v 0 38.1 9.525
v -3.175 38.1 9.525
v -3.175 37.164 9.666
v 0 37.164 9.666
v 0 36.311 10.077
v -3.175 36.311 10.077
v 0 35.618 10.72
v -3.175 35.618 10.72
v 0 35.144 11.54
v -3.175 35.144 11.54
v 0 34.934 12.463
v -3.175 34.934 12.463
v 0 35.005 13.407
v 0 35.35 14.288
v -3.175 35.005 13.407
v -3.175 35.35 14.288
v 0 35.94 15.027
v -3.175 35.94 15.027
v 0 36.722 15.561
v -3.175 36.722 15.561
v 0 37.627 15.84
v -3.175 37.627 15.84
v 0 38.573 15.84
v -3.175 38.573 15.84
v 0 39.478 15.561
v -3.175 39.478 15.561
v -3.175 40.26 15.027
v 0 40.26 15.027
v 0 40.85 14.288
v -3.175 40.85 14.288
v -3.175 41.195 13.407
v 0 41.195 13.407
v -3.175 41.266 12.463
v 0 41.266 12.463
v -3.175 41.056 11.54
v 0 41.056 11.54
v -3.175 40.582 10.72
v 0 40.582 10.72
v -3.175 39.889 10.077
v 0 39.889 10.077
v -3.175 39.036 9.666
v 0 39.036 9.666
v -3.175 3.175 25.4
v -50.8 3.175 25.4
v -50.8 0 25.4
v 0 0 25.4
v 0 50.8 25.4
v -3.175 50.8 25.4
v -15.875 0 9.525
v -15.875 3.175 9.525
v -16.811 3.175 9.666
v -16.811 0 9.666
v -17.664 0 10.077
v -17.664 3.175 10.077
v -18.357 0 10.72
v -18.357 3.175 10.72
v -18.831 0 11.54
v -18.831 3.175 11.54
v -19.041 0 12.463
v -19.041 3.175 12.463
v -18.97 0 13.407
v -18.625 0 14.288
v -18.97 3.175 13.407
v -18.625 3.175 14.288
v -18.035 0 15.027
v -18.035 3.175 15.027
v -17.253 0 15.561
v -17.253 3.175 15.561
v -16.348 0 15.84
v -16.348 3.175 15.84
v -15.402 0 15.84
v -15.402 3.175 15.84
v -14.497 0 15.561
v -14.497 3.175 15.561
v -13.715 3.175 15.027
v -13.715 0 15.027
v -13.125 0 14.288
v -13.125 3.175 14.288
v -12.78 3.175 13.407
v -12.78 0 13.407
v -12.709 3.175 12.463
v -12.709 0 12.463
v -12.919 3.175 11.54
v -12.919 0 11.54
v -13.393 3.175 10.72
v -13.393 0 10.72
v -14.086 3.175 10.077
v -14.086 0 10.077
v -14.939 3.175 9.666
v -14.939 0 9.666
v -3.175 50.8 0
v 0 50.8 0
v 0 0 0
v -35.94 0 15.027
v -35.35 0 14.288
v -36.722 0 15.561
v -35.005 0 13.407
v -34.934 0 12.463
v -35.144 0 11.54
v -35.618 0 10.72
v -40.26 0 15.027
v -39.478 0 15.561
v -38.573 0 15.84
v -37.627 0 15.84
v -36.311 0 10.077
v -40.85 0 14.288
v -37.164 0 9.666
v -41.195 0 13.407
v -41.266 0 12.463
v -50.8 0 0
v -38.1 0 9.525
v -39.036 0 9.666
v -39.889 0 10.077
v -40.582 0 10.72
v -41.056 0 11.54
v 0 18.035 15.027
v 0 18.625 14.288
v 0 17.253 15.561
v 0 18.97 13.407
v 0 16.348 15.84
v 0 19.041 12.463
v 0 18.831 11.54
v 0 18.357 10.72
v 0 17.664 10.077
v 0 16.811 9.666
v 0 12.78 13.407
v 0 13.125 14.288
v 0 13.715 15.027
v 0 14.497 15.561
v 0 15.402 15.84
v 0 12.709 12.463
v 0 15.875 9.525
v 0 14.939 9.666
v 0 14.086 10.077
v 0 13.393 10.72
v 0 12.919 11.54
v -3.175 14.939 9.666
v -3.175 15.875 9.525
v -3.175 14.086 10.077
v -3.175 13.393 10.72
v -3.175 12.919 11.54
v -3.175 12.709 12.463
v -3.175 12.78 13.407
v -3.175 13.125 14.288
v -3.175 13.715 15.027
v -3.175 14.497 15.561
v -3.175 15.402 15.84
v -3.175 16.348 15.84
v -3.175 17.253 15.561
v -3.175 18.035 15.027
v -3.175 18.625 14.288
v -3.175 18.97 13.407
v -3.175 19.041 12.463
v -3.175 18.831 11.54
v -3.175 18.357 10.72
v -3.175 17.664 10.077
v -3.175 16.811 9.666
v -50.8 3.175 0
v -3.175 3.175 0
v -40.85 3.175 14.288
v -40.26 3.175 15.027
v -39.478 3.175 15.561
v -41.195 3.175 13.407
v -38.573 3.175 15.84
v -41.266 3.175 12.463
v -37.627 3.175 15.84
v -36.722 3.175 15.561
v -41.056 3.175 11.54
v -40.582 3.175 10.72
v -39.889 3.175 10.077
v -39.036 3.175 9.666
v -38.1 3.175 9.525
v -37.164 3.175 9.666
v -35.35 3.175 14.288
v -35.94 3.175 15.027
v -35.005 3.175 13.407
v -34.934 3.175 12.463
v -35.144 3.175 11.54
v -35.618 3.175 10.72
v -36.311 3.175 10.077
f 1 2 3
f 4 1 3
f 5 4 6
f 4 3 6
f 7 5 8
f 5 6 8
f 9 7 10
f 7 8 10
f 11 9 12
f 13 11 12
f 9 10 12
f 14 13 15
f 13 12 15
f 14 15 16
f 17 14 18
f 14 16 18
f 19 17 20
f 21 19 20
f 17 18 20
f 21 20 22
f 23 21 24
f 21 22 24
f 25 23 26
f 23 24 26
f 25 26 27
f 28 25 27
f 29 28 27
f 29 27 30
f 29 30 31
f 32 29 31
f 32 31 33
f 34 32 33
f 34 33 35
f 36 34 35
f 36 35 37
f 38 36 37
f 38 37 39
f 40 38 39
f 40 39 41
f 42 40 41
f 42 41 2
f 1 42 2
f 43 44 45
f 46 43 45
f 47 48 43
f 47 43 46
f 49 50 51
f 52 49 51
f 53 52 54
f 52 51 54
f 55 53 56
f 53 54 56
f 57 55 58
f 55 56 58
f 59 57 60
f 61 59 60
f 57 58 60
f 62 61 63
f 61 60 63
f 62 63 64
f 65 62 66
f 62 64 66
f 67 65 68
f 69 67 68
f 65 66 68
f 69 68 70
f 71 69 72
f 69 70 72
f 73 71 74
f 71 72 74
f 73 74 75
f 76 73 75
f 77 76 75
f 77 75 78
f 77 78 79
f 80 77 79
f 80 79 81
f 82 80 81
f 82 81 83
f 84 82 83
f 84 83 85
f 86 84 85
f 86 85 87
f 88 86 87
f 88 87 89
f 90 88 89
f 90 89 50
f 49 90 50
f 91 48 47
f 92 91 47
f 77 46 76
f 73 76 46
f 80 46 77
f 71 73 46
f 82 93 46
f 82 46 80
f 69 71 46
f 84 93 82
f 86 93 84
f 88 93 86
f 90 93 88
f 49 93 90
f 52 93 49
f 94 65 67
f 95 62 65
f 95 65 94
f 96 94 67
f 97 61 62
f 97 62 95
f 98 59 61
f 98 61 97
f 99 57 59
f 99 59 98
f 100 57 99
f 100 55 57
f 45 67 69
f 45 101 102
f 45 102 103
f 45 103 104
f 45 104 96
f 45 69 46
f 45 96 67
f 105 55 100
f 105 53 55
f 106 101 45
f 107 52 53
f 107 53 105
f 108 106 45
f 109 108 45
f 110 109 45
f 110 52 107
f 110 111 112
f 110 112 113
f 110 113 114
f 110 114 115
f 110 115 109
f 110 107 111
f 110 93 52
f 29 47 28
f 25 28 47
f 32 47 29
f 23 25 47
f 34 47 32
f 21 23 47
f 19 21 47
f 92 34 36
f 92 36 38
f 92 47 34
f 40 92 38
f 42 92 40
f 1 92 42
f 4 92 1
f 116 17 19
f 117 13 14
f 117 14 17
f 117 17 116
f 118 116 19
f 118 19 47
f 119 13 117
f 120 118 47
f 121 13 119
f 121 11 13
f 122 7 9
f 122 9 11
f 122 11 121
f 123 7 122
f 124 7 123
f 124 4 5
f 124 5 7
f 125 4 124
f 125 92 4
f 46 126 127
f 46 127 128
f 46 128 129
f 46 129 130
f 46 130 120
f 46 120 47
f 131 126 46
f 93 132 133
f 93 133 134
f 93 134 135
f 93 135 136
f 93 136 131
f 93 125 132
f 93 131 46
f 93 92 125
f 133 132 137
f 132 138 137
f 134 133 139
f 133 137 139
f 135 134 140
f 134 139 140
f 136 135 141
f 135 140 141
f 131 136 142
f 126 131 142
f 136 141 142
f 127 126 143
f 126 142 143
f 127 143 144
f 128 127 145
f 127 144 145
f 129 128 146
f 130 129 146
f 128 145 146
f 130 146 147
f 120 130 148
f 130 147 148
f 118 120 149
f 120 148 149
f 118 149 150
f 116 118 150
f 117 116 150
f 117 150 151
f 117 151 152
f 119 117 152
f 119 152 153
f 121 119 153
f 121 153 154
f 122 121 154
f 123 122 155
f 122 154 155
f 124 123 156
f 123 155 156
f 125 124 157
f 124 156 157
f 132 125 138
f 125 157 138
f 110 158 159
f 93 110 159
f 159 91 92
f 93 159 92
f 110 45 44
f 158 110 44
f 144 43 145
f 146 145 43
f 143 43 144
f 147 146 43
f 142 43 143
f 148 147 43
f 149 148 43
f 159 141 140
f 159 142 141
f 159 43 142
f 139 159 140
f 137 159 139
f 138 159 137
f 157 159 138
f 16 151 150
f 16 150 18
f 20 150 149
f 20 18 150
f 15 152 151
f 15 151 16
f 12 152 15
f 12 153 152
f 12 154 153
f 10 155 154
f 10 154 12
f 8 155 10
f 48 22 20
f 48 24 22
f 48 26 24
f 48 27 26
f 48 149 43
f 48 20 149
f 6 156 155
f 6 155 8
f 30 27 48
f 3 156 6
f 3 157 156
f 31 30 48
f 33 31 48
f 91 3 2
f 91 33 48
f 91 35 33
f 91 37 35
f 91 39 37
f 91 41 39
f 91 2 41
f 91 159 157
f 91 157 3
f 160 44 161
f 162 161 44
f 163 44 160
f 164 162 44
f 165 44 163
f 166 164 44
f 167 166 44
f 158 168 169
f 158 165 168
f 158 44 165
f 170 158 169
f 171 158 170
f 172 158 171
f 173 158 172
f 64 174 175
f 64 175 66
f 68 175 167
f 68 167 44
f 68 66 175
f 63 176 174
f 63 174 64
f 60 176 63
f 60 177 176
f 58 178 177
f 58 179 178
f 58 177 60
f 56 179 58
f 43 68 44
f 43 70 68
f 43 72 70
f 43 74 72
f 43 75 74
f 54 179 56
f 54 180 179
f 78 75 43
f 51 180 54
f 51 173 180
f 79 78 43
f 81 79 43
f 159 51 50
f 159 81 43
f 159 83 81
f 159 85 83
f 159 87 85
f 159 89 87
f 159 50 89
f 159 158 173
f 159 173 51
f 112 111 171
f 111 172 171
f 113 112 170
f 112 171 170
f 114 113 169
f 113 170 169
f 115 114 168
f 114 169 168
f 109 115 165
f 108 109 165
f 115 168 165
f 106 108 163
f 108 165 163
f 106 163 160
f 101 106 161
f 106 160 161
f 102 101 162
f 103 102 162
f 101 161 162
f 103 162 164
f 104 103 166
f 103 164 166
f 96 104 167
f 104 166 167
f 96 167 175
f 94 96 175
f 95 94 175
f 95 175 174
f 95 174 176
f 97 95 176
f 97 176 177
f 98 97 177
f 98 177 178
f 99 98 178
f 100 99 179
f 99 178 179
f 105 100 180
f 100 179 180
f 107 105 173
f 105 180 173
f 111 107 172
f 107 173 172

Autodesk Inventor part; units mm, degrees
ref_plane "YZ Plane" through (0, 0, 0) normal (1, 0, 0) x (0, 1, 0)
ref_plane "XZ Plane" through (0, 0, 0) normal (0, 1, 0) x (-1, 0, 0)
ref_plane "XY Plane" through (0, 0, 0) normal (0, 0, 1) x (1, 0, 0)
sketch "Sketch1" plane through (0, 0, 0) normal (0, 0, 1) x (1, 0, 0)
  line L0 (0, 0) -> (-50.8, 0)
  line L1 (-50.8, 0) -> (-50.8, 3.175)
  line L2 (-50.8, 3.175) -> (-3.175, 3.175)
  line L3 (-3.175, 3.175) -> (-3.175, 50.8)
  line L4 (-3.175, 50.8) -> (0, 50.8)
  line L5 (0, 50.8) -> (0, 0)
  dimension "d0" = 3.175
  dimension "d1" = 50.8
extrude "Extrusion1" add sketch "Sketch1" along normal blind 25.4
sketch "Sketch2" plane through (-50.8, 0, 0) normal (0, -1, 0) x (1, 0, 0)
  line L0 (50.8, 0) -> (50.8, 25.4) projected
  line L1 (0, 25.4) -> (50.8, 25.4) projected
  point P0 (12.7, 12.7)
  point P1 (34.925, 12.7)
  dimension "d4" = 15.875
  dimension "d5" = 22.225
  dimension "d6" = 12.7
  dimension "d7" = 12.7
hole "Hole1" at (-38.1, 0, 12.7) at (-15.875, 0, 12.7) direction (0, 1, 0) diameter 6.35 end through all
sketch "Sketch3" plane through (0, 0, 0) normal (1, 0, 0) x (0, 0, -1)
  line L0 (0, 50.8) -> (0, 0) projected
  line L1 (-15.875, 3.175) -> (-9.525, 3.175) projected
  point P0 (-12.7, 15.875)
  point P1 (-12.7, 38.1)
  dimension "d15" = 12.7
  dimension "d16" = 12.7
  dimension "d17" = 12.7
  dimension "d18" = 22.225
hole "Hole2" at (0, 15.875, 12.7) at (0, 38.1, 12.7) direction (-1, 0, 0) diameter 6.35 end through all
properties part number "2x1 angle bracket" material "Aluminum 6061"
